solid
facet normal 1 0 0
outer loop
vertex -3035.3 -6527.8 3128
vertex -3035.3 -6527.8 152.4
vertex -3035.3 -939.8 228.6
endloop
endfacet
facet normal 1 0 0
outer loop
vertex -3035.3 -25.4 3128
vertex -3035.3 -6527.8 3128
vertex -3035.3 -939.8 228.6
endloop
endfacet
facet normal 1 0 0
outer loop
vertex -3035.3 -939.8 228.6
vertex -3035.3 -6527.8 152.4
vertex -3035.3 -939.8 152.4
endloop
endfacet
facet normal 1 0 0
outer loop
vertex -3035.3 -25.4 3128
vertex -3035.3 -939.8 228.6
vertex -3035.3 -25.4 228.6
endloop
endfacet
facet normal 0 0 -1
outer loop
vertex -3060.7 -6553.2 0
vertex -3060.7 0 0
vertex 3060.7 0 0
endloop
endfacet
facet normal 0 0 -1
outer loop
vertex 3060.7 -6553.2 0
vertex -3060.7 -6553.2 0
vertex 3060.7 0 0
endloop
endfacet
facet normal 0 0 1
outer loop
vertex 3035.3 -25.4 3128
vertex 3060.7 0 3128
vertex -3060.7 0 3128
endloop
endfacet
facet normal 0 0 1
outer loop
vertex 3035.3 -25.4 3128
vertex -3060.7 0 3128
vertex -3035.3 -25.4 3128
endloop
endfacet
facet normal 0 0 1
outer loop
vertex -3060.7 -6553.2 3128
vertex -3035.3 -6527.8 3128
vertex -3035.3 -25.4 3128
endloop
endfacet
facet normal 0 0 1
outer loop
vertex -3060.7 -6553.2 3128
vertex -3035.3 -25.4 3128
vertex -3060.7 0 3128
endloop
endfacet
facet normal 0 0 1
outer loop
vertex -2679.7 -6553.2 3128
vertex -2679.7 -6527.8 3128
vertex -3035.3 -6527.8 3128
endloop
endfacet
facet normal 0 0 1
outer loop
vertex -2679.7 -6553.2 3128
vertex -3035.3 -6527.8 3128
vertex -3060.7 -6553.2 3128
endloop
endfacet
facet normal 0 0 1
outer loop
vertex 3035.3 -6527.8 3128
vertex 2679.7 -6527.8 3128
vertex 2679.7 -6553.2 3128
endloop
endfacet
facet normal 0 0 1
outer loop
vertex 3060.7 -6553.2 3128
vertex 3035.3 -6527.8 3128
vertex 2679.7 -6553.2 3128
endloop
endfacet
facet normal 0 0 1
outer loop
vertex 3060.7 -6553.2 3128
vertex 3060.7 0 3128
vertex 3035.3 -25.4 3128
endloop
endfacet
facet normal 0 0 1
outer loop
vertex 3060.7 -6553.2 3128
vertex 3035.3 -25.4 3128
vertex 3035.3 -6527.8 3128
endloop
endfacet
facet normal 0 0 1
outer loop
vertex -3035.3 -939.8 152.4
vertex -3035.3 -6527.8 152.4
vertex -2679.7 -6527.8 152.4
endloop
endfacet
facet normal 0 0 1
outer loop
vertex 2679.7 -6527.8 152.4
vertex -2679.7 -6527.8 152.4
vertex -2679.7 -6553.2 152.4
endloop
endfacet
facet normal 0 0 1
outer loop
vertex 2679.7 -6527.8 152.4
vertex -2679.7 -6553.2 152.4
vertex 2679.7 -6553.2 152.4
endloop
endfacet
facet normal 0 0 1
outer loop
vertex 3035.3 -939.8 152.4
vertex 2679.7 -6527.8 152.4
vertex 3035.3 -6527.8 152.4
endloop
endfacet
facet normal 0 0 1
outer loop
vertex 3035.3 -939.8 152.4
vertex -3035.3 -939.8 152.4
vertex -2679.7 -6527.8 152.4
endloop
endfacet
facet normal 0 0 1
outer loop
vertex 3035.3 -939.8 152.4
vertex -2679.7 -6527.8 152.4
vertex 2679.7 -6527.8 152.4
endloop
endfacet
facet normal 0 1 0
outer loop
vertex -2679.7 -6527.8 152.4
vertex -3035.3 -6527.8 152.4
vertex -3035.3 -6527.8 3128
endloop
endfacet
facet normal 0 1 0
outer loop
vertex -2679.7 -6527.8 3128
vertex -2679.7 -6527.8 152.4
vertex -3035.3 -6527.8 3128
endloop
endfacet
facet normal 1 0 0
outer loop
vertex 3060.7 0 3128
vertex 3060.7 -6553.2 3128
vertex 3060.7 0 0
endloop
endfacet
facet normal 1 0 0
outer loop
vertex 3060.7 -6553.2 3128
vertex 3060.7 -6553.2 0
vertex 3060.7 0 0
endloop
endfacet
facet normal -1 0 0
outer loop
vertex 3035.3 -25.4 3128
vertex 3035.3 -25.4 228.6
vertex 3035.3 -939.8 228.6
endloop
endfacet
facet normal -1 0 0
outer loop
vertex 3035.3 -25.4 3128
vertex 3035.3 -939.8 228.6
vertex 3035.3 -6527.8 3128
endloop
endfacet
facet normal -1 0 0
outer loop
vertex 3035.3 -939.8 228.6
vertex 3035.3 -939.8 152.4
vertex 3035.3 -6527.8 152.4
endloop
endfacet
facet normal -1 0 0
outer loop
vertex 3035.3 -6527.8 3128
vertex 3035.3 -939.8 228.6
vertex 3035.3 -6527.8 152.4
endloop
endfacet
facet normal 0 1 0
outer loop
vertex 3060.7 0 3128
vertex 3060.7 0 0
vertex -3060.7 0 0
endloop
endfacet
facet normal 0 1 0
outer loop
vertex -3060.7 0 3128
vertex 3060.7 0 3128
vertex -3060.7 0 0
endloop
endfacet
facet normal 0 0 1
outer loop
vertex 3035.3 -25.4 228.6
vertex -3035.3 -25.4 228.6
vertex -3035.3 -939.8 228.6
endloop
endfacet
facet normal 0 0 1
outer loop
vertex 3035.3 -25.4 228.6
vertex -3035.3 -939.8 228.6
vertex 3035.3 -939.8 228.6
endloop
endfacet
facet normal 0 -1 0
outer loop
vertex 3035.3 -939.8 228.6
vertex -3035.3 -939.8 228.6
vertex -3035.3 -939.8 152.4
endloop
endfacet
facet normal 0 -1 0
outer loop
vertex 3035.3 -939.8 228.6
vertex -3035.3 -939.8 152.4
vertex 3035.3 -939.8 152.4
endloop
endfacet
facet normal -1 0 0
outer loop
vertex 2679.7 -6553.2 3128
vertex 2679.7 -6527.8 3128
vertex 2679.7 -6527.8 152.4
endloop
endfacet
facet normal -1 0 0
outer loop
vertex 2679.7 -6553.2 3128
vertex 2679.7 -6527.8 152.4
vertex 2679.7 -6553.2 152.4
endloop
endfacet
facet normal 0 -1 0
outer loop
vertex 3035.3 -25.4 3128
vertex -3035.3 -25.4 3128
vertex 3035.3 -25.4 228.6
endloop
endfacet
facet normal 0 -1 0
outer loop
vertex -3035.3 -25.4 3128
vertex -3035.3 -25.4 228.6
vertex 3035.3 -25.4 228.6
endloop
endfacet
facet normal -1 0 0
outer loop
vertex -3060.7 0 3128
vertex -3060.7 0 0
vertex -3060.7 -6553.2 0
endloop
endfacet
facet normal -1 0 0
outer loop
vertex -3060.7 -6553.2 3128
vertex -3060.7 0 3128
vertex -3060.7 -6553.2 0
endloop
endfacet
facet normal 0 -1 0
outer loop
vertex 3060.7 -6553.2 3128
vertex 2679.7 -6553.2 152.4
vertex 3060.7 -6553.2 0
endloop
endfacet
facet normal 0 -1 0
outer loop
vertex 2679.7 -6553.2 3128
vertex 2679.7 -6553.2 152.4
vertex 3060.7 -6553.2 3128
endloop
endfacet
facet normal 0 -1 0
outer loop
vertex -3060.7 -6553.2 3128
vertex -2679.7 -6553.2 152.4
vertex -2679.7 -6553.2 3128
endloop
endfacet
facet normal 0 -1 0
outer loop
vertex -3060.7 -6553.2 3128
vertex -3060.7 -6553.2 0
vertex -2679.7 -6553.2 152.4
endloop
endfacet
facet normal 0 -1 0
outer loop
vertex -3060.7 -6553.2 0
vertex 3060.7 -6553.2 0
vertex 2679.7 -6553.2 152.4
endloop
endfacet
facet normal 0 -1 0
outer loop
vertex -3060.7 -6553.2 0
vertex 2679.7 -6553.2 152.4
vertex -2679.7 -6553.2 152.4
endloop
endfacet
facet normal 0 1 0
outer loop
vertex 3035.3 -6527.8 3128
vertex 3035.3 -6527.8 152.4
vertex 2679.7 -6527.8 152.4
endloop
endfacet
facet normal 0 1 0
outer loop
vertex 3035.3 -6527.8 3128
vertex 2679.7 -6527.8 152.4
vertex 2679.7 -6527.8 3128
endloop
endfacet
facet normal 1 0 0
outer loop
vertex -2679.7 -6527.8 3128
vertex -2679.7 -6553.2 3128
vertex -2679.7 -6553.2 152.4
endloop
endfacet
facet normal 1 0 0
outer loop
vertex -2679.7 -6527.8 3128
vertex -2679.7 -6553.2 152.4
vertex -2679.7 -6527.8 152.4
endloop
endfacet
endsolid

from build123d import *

# Parameters (mm, degrees)
F0_W      = 6121.4
F0_H      = 6553.2
F1_DEPTH  = 3048
F2_W      = 6070.6
F2_H      = 5613.4
F3_DEPTH  = 2895.6
F4_W      = 6070.6
F4_H      = 25.4
F5_DEPTH  = 80
F6_DEPTH  = 2819.4
F7_W      = 25.4
F7_H      = 2975.6
F8_DEPTH  = 355.6
F9_W      = 25.4
F9_H      = 2975.6
F10_DEPTH = 355.6


with BuildPart() as f1:
    # F0 (on Top) → F1 (new body)
    with BuildSketch(Plane.XY):
        with Locations((0, -3276.6)):
            Rectangle(F0_W, F0_H)
    extrude(amount=F1_DEPTH)

    # F2 (on face) → F3 (cut)
    with BuildSketch(Plane.XY.offset(3048)):
        with Locations((0, -3746.5)):
            Rectangle(F2_W, F2_H)
    extrude(amount=-F3_DEPTH, mode=Mode.SUBTRACT)

    # F4 (on face) → F5 (join)
    with BuildSketch(Plane.XY.offset(3048)):
        Polygon((-3060.7, 0), (-3060.7, -6553.2), (-3035.3, -6553.2), (-3035.3, -25.4), (-3035.3, 0), align=None)
        with Locations((0, -12.7)):
            Rectangle(F4_W, F4_H)
        Polygon((3035.3, 0), (3035.3, -25.4), (3035.3, -6553.2), (3060.7, -6553.2), (3060.7, 0), align=None)
    extrude(amount=F5_DEPTH)

    # F6 (cut): a face of the model
    f6_faces = [f1.faces().sort_by_distance(p)[0] for p in [
        (0, -482.6, 3048),
    ]]
    extrude(f6_faces, amount=-F6_DEPTH, mode=Mode.SUBTRACT)

    # F7 (on face) → F8 (join)
    with BuildSketch(Plane.YZ.offset(-3035.3)):
        with Locations((-6540.5, 1640.2)):
            Rectangle(F7_W, F7_H)
    extrude(amount=F8_DEPTH)

    # F9 (on face) → F10 (join)
    with BuildSketch(Plane(origin=(3035.3, 0, 0), x_dir=(0, -1, 0), z_dir=(-1, 0, 0))):
        with Locations((6540.5, 1640.2)):
            Rectangle(F9_W, F9_H)
    extrude(amount=F10_DEPTH)


solid = f1.part
